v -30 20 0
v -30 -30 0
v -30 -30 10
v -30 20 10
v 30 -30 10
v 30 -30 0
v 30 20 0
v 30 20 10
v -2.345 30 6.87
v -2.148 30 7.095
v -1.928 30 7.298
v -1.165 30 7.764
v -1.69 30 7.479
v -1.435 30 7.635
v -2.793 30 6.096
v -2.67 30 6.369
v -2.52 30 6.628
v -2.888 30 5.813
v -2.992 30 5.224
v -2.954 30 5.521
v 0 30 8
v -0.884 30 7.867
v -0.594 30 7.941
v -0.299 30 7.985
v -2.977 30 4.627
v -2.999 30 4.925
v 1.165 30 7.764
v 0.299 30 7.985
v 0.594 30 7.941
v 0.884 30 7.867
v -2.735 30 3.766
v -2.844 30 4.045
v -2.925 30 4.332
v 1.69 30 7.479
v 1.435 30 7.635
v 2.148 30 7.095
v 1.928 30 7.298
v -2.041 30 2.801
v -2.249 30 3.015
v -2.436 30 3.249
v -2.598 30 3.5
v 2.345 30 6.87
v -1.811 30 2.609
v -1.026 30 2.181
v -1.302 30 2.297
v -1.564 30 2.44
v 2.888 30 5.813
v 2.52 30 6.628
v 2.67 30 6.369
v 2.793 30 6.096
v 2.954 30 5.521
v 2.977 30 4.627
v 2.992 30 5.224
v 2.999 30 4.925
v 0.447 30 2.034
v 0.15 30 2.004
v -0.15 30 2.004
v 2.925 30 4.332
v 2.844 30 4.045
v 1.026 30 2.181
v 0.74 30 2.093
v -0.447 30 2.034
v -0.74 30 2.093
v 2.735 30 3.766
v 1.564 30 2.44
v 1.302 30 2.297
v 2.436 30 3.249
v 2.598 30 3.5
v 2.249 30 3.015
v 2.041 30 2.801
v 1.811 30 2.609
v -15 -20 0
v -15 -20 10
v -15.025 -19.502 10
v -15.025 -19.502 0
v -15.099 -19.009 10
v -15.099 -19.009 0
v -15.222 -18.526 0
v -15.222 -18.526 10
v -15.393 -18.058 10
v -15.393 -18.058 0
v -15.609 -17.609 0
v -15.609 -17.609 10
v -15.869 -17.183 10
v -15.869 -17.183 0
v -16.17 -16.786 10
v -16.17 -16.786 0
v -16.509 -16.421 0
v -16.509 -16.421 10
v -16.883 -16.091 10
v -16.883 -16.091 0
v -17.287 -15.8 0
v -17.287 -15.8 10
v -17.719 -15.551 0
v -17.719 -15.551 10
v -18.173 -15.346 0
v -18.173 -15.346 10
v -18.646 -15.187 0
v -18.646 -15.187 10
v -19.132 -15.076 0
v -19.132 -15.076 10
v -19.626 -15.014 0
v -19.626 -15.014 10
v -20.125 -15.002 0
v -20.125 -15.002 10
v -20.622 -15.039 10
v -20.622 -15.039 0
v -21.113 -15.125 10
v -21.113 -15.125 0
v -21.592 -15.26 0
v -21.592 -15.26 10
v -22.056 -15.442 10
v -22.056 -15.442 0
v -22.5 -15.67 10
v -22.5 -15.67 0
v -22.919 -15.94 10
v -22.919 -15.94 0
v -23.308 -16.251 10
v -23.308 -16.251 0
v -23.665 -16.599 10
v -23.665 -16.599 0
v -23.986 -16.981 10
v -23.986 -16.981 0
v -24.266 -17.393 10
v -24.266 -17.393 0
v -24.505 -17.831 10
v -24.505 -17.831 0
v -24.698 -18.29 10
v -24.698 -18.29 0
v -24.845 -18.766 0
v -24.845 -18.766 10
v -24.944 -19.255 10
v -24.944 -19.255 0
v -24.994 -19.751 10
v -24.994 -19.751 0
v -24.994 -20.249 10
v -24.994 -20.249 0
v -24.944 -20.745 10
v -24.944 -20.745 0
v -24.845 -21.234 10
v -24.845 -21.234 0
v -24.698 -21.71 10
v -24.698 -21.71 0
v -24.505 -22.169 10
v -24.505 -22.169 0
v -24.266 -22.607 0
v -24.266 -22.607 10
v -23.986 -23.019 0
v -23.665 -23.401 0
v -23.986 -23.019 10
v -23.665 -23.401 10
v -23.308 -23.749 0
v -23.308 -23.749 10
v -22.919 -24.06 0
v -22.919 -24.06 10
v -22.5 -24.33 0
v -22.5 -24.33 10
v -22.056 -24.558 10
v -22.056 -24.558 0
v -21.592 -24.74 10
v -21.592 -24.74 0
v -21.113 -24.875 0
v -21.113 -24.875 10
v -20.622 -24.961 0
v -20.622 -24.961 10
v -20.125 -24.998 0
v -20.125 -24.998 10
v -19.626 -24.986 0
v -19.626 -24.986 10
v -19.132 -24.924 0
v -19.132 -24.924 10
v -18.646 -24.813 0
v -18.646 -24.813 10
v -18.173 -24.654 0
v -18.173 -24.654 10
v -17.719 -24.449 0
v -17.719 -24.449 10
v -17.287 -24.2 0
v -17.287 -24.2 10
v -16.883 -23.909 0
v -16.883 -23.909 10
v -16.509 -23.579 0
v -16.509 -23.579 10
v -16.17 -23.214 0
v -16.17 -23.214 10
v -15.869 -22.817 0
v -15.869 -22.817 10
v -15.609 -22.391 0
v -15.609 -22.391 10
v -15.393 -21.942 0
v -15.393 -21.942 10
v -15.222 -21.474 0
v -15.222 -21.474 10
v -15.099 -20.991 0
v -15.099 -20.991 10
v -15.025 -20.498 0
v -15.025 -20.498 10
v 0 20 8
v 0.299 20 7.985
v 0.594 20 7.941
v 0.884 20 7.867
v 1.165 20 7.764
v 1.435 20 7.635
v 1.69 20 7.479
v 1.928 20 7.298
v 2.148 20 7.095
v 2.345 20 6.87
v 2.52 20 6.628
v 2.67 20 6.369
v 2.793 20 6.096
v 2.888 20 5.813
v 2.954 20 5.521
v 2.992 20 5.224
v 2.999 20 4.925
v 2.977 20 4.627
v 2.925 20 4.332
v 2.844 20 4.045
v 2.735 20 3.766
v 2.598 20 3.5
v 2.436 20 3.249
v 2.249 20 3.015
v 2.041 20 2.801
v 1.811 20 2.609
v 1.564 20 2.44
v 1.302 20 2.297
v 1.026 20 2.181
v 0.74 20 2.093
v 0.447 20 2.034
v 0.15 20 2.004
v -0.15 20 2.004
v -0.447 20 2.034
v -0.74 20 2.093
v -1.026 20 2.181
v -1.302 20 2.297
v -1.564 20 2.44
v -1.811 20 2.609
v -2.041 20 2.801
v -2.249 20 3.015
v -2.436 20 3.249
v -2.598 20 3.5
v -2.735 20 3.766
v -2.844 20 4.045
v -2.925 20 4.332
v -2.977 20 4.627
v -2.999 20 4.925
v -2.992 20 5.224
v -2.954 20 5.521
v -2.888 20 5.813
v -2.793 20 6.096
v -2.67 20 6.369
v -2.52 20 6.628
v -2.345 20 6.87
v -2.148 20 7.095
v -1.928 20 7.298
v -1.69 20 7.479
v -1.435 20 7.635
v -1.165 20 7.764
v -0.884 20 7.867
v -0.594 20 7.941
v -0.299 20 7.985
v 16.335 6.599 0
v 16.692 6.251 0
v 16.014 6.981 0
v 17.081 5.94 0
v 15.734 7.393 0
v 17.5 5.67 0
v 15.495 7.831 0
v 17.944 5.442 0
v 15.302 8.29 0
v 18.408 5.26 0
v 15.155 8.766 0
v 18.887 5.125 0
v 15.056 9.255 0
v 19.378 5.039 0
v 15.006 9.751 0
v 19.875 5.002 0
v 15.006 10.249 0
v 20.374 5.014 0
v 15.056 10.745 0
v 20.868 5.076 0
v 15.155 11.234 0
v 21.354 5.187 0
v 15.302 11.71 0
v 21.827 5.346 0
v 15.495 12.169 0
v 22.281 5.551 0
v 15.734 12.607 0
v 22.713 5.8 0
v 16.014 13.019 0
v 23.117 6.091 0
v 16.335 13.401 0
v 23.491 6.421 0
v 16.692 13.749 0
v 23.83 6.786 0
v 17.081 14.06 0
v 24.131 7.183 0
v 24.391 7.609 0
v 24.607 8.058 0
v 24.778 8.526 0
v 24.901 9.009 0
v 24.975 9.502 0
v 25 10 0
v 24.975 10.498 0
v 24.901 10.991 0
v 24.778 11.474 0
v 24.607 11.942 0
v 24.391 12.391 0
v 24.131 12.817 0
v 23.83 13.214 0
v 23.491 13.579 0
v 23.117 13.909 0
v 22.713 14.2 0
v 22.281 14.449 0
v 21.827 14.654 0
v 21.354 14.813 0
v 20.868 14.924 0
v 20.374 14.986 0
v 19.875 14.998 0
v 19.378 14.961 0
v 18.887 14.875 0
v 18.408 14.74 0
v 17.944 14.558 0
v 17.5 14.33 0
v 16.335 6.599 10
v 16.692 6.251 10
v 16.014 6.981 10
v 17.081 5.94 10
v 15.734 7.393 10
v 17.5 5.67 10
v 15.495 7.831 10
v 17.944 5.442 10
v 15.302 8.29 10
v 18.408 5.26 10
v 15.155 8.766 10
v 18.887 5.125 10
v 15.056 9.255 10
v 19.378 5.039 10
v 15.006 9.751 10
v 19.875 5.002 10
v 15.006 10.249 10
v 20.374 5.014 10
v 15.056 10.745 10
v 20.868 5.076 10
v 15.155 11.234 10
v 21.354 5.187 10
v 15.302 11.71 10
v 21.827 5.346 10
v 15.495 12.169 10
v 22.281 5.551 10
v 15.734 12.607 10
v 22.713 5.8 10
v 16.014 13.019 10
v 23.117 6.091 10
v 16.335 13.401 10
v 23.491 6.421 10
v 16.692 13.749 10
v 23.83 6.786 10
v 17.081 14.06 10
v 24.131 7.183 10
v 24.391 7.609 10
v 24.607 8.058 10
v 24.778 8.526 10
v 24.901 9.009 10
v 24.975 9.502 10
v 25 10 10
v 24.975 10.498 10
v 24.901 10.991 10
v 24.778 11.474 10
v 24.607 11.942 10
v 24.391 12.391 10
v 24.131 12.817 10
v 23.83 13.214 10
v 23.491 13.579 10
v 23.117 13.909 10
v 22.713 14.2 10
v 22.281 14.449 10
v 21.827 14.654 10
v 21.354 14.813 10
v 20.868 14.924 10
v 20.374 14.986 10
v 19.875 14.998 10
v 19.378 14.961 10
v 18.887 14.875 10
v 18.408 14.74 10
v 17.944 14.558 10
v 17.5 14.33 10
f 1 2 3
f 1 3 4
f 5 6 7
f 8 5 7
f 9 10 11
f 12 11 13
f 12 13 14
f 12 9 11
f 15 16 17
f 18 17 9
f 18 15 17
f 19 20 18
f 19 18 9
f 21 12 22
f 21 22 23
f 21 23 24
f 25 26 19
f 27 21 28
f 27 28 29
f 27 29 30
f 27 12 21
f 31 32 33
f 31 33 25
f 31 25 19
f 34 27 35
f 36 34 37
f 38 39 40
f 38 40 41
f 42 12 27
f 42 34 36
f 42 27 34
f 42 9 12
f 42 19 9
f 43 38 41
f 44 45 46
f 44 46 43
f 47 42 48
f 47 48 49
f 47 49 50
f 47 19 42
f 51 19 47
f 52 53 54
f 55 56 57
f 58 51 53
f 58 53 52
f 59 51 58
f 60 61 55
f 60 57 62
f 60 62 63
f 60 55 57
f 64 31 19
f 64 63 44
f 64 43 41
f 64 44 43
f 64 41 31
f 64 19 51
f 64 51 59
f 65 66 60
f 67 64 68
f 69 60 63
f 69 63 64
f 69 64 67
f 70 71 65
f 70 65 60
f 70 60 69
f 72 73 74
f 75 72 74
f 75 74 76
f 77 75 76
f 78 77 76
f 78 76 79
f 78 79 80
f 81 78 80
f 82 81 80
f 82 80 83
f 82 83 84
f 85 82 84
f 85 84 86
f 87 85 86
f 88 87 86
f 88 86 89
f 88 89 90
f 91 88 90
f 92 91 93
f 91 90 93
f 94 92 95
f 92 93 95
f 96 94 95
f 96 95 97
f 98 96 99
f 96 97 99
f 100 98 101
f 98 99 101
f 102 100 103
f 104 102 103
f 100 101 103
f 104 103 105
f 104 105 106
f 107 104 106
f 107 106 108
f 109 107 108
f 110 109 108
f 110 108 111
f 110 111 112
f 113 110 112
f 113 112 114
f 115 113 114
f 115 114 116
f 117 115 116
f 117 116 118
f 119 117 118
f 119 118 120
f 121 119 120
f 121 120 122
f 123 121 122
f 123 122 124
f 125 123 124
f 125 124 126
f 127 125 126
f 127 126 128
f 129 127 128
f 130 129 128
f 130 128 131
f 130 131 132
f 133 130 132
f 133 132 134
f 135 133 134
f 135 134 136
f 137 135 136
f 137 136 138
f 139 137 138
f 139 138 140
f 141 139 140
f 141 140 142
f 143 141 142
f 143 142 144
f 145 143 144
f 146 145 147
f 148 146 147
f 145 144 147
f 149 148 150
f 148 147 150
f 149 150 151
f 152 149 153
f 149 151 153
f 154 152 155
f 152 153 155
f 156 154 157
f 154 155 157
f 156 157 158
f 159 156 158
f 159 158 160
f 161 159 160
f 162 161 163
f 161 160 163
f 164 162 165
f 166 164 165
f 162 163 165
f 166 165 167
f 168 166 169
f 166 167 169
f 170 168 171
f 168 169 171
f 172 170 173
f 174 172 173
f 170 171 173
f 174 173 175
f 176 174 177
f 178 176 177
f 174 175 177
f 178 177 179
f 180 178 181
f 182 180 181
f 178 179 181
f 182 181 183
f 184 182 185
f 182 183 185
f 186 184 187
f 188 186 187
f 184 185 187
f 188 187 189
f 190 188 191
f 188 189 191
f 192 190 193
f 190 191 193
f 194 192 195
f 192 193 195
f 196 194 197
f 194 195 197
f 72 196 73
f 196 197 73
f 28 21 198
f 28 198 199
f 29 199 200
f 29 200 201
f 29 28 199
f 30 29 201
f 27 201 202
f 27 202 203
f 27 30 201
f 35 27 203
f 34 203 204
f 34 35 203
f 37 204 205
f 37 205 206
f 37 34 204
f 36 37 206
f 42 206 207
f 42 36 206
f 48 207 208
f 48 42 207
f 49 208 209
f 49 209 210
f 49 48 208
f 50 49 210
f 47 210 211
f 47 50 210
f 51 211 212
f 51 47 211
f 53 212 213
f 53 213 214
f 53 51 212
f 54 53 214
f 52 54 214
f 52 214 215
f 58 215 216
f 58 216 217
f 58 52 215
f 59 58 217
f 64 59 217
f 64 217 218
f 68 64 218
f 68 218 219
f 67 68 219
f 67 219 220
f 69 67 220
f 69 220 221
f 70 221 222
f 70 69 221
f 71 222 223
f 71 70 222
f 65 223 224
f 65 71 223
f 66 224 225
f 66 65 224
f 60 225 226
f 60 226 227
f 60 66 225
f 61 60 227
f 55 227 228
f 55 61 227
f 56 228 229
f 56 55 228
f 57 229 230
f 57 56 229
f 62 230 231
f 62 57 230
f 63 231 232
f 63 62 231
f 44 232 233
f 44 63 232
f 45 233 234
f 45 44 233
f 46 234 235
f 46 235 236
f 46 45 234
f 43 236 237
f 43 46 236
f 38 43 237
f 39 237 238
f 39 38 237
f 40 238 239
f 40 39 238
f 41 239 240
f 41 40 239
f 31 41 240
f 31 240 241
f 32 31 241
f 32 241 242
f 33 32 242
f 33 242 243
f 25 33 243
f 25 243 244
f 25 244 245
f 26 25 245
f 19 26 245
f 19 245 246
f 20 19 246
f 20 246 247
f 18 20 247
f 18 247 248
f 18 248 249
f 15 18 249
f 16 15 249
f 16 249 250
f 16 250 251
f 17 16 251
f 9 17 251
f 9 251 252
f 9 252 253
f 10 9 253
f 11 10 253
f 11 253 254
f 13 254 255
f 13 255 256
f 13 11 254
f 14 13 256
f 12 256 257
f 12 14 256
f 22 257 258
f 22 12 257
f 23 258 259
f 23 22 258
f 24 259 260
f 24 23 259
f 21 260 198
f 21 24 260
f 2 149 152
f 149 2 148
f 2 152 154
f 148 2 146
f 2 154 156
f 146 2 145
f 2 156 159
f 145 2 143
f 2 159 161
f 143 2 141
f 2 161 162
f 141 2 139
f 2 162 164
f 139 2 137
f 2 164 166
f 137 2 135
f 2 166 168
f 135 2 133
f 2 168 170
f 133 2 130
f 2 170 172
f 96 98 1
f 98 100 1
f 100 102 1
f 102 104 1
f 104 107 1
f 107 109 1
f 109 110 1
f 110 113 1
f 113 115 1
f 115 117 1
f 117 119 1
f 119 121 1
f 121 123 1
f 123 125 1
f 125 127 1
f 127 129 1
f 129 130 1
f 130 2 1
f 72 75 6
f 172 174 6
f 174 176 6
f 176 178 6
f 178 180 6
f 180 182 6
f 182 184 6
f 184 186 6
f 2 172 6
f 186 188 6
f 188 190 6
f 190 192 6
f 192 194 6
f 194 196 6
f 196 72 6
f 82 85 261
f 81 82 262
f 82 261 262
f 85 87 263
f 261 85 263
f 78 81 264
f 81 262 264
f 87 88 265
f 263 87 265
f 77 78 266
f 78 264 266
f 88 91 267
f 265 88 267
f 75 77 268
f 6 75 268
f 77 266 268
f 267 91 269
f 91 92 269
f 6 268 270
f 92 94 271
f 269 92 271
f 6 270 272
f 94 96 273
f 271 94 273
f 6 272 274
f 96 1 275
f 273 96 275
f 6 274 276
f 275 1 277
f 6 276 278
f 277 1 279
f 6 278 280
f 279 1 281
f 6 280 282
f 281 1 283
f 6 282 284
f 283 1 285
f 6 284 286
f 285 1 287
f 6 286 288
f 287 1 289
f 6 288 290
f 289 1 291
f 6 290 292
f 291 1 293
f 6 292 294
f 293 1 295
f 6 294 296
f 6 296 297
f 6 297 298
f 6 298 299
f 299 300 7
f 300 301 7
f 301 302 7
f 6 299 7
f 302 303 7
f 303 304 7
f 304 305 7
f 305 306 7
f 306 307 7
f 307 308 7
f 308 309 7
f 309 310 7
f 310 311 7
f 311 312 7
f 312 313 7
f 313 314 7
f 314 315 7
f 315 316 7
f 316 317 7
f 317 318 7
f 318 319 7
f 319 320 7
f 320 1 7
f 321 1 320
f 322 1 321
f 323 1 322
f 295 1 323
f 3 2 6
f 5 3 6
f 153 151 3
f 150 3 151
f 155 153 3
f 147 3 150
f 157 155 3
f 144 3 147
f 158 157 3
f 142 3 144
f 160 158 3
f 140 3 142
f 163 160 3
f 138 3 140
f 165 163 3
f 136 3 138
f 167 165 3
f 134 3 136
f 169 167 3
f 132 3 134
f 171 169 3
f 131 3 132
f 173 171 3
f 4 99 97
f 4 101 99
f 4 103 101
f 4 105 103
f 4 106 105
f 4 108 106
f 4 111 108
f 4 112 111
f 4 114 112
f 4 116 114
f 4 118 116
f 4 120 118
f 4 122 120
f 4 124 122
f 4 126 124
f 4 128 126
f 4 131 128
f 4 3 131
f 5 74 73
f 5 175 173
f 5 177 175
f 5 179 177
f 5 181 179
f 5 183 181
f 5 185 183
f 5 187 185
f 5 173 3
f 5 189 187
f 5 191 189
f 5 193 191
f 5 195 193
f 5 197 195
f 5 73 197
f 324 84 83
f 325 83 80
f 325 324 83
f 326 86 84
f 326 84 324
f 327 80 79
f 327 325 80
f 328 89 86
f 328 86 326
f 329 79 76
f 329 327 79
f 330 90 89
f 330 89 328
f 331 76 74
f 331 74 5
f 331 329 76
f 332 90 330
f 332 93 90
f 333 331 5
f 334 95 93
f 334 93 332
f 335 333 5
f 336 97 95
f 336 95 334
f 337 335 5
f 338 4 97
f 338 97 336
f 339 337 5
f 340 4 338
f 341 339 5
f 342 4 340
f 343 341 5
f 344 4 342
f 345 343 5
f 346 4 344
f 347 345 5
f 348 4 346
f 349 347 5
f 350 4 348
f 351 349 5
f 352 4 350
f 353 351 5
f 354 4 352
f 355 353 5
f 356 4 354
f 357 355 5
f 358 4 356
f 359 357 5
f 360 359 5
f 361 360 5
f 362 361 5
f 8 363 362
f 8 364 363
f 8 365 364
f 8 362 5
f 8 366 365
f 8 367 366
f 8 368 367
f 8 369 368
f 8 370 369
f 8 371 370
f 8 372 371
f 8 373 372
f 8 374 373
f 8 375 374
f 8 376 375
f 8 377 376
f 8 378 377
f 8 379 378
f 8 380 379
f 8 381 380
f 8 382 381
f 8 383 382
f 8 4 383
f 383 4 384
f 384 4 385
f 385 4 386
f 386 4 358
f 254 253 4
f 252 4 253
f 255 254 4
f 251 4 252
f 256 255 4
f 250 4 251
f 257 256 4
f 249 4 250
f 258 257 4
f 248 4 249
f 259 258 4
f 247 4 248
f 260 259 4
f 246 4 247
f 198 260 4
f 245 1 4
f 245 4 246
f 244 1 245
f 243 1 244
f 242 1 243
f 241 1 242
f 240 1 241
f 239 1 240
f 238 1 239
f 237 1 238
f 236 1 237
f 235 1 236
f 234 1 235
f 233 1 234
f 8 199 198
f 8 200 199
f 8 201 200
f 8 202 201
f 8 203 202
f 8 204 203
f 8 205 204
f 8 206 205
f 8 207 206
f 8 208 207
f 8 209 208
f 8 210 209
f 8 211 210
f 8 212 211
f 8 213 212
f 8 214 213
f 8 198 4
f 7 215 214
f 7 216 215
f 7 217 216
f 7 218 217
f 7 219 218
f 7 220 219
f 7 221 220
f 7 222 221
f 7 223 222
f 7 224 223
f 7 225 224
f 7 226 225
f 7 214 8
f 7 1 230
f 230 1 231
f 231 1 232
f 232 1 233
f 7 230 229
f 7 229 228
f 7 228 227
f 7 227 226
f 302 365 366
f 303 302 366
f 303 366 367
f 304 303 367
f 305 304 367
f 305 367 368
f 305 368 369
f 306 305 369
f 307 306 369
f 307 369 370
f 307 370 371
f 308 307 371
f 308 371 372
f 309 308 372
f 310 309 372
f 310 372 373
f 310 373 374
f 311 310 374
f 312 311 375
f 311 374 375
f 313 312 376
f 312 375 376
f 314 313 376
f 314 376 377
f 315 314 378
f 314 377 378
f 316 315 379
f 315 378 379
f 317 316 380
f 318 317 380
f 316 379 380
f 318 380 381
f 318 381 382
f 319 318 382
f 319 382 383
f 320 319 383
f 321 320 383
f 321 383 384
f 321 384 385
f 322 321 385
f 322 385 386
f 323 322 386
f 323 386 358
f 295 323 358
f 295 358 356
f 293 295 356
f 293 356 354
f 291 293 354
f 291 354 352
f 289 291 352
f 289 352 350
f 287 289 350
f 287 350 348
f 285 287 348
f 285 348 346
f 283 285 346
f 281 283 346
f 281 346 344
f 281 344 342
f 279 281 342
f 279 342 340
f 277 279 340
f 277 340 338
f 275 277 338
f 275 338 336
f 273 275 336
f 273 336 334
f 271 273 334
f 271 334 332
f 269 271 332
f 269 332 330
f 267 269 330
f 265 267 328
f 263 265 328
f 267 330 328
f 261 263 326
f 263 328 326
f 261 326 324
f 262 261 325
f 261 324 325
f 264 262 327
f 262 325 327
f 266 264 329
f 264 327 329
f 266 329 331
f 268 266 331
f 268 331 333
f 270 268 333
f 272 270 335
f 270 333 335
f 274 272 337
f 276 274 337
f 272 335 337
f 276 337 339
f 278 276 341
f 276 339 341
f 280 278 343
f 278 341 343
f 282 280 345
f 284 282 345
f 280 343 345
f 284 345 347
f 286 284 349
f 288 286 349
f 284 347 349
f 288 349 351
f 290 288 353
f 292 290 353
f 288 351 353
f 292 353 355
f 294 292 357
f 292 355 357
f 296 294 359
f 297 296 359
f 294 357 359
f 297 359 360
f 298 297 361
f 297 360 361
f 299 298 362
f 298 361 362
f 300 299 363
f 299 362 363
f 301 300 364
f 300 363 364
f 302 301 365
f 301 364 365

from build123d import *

# Parameters (mm, degrees)
SKETCH_1_W          = 60
SKETCH_1_H          = 60
EXTRUDE_1_DEPTH     = 10
SKETCH_2_W          = 60
SKETCH_2_H          = 10
SKETCH_2_R          = 3
CUT_EXTRUDE_1_DEPTH = 10
SKETCH_3_R          = 5
CUT_EXTRUDE_2_DEPTH = 44.588989435


with BuildPart() as part:
    # 草图1 → 凸台-拉伸1 (new body)
    with BuildSketch(Plane.XY):
        Rectangle(SKETCH_1_W, SKETCH_1_H)
    extrude(amount=EXTRUDE_1_DEPTH)

    # 草图2 → 切除-拉伸1 (cut)
    with BuildSketch(Plane(origin=(0, 30, 0), x_dir=(1, 0, 0), z_dir=(0, 1, 0))):
        with Locations((0, -5)):
            Rectangle(SKETCH_2_W, SKETCH_2_H)
        with Locations(Location((0, -5, 0), (0, 0, 270))):
            Circle(SKETCH_2_R, mode=Mode.SUBTRACT)
    extrude(amount=-CUT_EXTRUDE_1_DEPTH, mode=Mode.SUBTRACT)

    # 草图3 → 切除-拉伸2 (cut, through all)
    with BuildSketch(Plane.XY.offset(10)):
        with Locations((-20, -20)):
            Circle(SKETCH_3_R)
        with Locations((20, 10)):
            Circle(SKETCH_3_R)
    extrude(amount=-CUT_EXTRUDE_2_DEPTH, mode=Mode.SUBTRACT)


solid = part.part
